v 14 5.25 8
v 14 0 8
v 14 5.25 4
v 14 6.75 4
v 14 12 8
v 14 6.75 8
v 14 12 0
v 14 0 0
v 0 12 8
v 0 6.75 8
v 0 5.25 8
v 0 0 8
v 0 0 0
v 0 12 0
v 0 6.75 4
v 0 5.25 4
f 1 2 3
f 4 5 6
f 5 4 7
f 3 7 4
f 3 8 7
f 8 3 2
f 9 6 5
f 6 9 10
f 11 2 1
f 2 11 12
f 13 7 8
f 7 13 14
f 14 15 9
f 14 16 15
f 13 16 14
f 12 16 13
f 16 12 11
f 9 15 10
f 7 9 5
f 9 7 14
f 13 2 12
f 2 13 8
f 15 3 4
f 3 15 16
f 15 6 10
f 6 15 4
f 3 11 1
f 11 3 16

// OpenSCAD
$fn = 32;

// ----------------------------------------------------------------------
// Micro clip: slotted block, 5-20 mm class
// ----------------------------------------------------------------------

// --- parameters (mm) ---
block_l = 14;             // block length, X
block_w = 12;             // block width, Y
block_h = 8;              // block height, Z
slot_w = 1.5;             // slot width
slot_d = 4;               // slot depth from the top

difference() {
  cube([block_l, block_w, block_h]);
  translate([-1, block_w / 2 - slot_w / 2, block_h - slot_d])
    cube([block_l + 2, slot_w, slot_d + 1]);
}
